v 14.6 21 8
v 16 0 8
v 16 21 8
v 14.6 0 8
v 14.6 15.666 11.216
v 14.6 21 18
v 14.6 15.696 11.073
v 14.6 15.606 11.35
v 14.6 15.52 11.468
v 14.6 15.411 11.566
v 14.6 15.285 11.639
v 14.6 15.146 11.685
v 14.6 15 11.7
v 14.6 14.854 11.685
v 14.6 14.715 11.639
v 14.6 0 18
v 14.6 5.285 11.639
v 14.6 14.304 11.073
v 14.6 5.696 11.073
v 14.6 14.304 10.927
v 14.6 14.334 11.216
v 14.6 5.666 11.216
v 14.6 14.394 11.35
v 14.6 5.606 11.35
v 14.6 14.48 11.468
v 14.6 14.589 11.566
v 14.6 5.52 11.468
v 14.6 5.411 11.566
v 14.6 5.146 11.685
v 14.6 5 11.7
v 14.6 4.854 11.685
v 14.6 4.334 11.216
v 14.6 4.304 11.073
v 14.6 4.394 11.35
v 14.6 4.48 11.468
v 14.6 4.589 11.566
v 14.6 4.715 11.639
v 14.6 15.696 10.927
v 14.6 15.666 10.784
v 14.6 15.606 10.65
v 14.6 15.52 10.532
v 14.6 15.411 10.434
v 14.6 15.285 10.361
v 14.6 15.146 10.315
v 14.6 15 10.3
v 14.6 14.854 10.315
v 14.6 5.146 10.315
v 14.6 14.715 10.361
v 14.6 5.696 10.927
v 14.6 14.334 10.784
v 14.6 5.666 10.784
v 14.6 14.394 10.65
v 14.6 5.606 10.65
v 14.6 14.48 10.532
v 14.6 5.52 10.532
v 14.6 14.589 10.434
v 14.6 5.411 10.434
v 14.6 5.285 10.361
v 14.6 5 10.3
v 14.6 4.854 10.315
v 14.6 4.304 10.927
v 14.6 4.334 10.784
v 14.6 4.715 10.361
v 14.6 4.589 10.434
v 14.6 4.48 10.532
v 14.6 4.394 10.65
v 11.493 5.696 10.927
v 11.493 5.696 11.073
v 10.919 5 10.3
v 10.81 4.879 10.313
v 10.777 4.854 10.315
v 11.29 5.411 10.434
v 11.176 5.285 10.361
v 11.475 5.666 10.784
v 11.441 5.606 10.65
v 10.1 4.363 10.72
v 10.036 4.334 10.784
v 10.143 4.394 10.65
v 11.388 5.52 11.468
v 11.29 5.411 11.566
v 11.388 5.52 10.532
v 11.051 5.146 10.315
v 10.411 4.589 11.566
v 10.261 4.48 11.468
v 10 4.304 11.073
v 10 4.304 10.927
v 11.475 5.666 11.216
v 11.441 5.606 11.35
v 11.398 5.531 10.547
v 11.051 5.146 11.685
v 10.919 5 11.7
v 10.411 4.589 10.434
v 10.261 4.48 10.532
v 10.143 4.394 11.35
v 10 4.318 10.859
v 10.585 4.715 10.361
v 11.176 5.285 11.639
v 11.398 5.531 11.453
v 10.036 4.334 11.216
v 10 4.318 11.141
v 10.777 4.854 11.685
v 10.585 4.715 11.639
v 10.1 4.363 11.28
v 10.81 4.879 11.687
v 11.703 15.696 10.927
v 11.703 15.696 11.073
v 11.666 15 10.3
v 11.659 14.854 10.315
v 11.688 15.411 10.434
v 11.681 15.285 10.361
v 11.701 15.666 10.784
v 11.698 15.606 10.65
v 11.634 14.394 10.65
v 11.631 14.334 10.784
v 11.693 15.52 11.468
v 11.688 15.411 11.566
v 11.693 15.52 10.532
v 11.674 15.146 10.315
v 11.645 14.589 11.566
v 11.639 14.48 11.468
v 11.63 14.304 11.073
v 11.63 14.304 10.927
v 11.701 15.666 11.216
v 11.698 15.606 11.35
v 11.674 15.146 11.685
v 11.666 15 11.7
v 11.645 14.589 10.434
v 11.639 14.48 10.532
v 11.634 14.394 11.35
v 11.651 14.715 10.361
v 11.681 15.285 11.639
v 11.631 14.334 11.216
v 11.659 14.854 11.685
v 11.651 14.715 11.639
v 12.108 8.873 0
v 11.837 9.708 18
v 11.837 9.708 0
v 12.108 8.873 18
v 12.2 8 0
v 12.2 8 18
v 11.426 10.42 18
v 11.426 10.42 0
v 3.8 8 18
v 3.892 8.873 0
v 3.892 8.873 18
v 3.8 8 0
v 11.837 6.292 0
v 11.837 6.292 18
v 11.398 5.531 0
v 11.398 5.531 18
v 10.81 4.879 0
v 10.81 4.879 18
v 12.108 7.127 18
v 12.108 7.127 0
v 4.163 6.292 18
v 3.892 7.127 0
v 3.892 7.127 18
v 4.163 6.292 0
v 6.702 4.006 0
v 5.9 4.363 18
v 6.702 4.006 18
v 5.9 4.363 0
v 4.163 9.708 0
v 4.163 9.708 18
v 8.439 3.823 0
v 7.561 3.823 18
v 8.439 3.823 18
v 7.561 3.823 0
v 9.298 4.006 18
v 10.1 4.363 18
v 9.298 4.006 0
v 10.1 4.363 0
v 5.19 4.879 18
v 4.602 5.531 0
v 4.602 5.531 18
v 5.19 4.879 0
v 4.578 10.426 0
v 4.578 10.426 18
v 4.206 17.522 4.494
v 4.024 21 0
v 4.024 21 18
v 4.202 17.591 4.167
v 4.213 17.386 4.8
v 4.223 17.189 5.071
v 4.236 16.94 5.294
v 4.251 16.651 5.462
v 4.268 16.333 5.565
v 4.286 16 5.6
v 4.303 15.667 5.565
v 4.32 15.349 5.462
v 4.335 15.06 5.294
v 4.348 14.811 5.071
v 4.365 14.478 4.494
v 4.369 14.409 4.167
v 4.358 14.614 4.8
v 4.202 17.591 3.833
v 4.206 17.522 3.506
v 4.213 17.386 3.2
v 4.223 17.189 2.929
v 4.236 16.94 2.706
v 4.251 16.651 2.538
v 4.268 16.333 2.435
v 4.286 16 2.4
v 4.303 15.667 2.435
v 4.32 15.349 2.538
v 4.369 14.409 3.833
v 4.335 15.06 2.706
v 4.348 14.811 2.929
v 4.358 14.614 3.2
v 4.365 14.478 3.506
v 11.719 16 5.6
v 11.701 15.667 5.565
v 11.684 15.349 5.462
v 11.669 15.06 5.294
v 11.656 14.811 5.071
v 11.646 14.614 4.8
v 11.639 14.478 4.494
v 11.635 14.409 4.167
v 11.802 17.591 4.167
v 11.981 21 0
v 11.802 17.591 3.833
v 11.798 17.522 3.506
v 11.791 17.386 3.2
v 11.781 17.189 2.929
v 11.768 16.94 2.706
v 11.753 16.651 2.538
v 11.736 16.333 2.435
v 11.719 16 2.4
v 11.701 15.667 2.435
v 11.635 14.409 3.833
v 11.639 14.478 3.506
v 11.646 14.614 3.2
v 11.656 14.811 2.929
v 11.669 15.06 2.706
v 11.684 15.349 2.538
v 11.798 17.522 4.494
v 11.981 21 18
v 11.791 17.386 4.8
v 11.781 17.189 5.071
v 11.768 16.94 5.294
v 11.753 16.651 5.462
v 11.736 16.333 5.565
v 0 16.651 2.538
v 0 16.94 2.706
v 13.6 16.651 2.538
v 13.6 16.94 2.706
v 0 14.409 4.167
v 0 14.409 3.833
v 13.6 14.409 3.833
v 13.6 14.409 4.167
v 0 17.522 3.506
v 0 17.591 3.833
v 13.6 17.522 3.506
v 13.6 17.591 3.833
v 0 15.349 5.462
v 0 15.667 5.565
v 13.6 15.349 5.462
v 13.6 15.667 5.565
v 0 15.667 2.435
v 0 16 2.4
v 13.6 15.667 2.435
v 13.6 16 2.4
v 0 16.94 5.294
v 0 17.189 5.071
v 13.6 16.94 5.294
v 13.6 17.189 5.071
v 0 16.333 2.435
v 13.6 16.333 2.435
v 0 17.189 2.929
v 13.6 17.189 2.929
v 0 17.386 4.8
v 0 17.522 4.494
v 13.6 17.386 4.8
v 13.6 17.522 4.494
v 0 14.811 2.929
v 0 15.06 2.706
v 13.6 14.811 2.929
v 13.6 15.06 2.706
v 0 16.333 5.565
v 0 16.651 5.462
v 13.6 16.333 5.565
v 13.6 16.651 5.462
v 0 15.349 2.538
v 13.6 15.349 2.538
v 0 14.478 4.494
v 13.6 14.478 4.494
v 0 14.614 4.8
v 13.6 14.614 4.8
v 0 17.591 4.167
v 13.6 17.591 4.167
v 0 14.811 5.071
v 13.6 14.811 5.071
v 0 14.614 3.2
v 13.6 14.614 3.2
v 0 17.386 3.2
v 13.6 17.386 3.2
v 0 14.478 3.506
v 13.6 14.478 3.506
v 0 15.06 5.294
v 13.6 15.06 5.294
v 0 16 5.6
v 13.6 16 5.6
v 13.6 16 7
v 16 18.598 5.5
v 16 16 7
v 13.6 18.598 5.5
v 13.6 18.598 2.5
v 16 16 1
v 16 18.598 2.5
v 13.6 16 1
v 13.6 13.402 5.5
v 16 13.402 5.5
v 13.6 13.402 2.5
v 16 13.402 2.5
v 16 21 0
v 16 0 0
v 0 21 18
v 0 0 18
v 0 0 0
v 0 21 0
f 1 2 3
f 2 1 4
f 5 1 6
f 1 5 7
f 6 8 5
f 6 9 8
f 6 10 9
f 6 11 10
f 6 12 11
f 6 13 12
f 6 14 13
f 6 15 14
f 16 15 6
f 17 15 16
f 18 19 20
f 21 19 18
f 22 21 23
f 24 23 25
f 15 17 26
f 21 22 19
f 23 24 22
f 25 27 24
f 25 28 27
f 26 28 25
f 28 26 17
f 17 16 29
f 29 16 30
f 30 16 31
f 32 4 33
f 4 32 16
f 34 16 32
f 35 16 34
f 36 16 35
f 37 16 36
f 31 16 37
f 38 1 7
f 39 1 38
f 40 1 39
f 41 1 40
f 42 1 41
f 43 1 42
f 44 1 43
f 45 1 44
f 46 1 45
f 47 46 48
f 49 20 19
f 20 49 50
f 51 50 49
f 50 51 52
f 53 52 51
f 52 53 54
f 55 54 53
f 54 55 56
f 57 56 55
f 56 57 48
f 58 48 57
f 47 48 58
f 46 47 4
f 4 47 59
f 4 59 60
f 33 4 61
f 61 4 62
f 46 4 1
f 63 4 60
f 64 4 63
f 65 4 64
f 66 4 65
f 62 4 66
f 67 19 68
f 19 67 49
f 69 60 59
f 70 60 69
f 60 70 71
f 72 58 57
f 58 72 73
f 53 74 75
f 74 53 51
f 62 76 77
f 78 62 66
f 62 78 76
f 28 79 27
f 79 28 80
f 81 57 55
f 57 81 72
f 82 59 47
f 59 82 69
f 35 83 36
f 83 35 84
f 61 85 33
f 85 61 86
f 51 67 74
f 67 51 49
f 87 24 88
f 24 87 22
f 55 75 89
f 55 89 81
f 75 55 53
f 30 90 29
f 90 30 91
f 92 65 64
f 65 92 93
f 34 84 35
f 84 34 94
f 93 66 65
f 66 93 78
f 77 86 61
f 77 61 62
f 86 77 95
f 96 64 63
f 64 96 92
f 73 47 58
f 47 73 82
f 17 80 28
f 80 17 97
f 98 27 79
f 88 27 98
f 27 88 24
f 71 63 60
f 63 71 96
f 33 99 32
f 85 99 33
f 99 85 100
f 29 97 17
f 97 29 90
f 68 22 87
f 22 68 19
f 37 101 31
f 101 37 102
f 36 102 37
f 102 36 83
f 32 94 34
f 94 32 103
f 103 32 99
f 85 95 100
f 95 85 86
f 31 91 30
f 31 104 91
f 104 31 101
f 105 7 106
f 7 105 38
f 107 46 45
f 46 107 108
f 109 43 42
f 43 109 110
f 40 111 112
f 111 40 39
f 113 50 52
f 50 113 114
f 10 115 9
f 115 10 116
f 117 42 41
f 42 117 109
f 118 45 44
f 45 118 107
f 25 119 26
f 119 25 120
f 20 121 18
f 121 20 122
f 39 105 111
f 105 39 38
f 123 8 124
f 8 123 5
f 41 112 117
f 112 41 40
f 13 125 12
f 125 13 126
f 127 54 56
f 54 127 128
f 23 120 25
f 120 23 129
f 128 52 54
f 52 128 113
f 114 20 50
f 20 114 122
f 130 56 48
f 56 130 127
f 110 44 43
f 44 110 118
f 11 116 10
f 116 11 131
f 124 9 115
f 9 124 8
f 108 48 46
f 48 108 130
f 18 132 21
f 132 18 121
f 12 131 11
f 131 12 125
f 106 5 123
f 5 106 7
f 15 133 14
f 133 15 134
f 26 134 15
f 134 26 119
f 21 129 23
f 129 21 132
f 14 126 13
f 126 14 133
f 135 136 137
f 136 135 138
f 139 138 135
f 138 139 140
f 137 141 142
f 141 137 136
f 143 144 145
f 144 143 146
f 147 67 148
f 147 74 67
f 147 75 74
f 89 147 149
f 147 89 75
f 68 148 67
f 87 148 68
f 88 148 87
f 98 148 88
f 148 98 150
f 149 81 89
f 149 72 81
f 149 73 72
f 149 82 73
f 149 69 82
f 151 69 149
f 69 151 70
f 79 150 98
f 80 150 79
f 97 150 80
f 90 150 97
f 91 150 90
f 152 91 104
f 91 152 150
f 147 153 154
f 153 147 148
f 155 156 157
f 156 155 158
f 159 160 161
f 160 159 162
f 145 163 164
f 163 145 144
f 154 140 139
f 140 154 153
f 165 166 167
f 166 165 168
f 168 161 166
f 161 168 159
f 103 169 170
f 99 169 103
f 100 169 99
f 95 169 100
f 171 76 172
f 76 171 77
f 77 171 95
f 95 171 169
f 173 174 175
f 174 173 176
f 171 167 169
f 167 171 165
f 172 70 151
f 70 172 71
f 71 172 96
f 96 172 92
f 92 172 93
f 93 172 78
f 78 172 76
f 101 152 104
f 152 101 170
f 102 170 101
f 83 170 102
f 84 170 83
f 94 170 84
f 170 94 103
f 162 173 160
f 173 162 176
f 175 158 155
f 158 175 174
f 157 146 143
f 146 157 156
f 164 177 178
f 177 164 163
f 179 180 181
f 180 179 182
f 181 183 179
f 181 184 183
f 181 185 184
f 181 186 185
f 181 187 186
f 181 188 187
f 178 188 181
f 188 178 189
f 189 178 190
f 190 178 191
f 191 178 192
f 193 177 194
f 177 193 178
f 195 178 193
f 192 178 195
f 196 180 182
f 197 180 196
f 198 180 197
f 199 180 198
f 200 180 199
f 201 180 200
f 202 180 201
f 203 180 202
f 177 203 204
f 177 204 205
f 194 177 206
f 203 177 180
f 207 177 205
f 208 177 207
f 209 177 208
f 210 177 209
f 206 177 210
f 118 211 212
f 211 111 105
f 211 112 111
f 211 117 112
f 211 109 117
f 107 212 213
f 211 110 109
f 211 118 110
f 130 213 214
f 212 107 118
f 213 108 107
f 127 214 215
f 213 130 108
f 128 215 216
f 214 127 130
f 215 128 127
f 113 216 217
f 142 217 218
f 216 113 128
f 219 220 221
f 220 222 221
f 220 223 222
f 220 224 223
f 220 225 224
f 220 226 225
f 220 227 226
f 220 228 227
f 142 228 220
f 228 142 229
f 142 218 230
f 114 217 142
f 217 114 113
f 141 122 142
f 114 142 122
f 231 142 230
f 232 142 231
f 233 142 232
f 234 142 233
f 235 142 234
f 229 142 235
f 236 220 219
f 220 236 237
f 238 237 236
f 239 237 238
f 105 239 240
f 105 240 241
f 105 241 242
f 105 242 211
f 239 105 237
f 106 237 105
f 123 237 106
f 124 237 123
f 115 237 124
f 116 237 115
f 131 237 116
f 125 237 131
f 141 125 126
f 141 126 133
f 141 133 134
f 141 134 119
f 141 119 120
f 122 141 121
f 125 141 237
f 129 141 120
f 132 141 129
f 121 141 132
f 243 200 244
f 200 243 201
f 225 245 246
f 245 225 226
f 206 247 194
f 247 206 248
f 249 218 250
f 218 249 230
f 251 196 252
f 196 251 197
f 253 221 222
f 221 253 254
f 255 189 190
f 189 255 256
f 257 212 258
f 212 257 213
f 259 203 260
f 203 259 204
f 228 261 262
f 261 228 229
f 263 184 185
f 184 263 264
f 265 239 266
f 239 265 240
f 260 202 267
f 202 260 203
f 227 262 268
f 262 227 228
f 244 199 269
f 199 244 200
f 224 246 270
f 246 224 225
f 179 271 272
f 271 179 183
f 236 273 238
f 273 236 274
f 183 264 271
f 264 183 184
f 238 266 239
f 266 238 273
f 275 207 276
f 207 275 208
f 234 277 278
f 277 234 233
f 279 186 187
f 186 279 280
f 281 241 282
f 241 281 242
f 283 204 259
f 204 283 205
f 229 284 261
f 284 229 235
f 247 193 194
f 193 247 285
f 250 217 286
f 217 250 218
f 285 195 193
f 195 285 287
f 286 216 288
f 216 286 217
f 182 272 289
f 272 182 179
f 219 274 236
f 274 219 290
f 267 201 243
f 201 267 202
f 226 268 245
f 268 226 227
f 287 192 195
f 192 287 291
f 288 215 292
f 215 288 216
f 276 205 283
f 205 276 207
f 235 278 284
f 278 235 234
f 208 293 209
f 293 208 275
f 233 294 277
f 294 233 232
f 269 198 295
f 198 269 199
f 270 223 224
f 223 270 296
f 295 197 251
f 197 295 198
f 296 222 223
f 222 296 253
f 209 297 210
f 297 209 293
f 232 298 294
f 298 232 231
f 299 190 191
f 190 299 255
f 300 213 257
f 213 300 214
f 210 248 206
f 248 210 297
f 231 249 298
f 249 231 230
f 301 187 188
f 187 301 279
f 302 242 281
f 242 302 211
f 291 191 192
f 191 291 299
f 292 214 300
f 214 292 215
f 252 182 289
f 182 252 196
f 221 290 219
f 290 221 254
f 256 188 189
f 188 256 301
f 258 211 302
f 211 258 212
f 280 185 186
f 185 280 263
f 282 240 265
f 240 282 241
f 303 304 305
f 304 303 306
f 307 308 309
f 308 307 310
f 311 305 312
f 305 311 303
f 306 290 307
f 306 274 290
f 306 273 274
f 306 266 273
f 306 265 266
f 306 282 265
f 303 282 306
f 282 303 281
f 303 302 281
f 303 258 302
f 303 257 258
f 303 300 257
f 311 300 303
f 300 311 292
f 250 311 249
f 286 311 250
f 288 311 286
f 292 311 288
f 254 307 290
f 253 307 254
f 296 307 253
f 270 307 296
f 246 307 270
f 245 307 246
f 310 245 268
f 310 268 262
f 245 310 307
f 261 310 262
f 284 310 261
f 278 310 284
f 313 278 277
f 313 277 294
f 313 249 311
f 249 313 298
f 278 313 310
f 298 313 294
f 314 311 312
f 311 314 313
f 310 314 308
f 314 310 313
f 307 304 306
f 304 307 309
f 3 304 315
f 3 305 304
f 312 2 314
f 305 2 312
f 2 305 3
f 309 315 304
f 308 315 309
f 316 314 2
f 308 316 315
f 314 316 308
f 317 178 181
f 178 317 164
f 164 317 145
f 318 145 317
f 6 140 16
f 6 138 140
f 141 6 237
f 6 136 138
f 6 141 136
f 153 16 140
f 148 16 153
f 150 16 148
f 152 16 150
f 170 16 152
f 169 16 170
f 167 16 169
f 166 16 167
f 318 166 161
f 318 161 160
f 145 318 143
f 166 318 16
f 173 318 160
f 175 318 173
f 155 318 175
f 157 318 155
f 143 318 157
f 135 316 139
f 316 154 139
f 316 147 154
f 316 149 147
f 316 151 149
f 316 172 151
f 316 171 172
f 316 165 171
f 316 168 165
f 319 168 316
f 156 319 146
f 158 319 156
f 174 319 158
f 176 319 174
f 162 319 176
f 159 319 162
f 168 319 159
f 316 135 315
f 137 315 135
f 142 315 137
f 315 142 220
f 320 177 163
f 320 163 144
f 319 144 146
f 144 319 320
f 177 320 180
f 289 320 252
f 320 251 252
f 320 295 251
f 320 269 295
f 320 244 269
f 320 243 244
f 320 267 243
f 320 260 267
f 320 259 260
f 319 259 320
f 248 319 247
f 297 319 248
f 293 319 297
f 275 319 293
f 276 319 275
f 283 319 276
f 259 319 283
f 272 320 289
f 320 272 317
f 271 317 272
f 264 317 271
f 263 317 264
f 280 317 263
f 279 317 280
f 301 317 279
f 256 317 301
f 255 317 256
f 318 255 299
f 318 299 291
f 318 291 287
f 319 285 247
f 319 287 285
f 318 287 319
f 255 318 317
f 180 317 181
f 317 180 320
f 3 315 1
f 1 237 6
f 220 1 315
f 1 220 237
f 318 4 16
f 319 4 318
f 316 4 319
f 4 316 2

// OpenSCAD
// RebeliX
//
// z endstop holder
// GNU GPL v3
// Martin Neruda <neruda@reprap4u.cz>
// http://www.reprap4u.cz

difference(){
	cube([16,21,18], center = false);
	union() {
		translate([14.6,-0.1,8])cube([1.5,22,11]);
		
		translate([10,5,11]) rotate([0,90,0]) cylinder(r=0.7, h = 10, $fn=30);
		translate([10,15,11]) rotate([0,90,0]) cylinder(r=0.7, h = 10, $fn=30);
		
		translate([16/2-3.3,10,-0.1])cube(size = [6.6,25,26]);
		translate([16/2,8,-0.1])cylinder(h = 30, r=4.2, $fn=30);

		translate([4.6,10,-0.1])rotate([0,0,3])cube([3,15,26]);
		translate([8.4,10,-0.1])rotate([0,0,-3])cube([3,15,26]);

		translate([-0.1,21-5,4])rotate([0,90,0])cylinder(h = 16, r=1.6, $fn=30);
		translate([16-2.4,21-5,4])rotate([0,90,0])cylinder(h = 2.5, r=3, $fn=6);	
	}
}
